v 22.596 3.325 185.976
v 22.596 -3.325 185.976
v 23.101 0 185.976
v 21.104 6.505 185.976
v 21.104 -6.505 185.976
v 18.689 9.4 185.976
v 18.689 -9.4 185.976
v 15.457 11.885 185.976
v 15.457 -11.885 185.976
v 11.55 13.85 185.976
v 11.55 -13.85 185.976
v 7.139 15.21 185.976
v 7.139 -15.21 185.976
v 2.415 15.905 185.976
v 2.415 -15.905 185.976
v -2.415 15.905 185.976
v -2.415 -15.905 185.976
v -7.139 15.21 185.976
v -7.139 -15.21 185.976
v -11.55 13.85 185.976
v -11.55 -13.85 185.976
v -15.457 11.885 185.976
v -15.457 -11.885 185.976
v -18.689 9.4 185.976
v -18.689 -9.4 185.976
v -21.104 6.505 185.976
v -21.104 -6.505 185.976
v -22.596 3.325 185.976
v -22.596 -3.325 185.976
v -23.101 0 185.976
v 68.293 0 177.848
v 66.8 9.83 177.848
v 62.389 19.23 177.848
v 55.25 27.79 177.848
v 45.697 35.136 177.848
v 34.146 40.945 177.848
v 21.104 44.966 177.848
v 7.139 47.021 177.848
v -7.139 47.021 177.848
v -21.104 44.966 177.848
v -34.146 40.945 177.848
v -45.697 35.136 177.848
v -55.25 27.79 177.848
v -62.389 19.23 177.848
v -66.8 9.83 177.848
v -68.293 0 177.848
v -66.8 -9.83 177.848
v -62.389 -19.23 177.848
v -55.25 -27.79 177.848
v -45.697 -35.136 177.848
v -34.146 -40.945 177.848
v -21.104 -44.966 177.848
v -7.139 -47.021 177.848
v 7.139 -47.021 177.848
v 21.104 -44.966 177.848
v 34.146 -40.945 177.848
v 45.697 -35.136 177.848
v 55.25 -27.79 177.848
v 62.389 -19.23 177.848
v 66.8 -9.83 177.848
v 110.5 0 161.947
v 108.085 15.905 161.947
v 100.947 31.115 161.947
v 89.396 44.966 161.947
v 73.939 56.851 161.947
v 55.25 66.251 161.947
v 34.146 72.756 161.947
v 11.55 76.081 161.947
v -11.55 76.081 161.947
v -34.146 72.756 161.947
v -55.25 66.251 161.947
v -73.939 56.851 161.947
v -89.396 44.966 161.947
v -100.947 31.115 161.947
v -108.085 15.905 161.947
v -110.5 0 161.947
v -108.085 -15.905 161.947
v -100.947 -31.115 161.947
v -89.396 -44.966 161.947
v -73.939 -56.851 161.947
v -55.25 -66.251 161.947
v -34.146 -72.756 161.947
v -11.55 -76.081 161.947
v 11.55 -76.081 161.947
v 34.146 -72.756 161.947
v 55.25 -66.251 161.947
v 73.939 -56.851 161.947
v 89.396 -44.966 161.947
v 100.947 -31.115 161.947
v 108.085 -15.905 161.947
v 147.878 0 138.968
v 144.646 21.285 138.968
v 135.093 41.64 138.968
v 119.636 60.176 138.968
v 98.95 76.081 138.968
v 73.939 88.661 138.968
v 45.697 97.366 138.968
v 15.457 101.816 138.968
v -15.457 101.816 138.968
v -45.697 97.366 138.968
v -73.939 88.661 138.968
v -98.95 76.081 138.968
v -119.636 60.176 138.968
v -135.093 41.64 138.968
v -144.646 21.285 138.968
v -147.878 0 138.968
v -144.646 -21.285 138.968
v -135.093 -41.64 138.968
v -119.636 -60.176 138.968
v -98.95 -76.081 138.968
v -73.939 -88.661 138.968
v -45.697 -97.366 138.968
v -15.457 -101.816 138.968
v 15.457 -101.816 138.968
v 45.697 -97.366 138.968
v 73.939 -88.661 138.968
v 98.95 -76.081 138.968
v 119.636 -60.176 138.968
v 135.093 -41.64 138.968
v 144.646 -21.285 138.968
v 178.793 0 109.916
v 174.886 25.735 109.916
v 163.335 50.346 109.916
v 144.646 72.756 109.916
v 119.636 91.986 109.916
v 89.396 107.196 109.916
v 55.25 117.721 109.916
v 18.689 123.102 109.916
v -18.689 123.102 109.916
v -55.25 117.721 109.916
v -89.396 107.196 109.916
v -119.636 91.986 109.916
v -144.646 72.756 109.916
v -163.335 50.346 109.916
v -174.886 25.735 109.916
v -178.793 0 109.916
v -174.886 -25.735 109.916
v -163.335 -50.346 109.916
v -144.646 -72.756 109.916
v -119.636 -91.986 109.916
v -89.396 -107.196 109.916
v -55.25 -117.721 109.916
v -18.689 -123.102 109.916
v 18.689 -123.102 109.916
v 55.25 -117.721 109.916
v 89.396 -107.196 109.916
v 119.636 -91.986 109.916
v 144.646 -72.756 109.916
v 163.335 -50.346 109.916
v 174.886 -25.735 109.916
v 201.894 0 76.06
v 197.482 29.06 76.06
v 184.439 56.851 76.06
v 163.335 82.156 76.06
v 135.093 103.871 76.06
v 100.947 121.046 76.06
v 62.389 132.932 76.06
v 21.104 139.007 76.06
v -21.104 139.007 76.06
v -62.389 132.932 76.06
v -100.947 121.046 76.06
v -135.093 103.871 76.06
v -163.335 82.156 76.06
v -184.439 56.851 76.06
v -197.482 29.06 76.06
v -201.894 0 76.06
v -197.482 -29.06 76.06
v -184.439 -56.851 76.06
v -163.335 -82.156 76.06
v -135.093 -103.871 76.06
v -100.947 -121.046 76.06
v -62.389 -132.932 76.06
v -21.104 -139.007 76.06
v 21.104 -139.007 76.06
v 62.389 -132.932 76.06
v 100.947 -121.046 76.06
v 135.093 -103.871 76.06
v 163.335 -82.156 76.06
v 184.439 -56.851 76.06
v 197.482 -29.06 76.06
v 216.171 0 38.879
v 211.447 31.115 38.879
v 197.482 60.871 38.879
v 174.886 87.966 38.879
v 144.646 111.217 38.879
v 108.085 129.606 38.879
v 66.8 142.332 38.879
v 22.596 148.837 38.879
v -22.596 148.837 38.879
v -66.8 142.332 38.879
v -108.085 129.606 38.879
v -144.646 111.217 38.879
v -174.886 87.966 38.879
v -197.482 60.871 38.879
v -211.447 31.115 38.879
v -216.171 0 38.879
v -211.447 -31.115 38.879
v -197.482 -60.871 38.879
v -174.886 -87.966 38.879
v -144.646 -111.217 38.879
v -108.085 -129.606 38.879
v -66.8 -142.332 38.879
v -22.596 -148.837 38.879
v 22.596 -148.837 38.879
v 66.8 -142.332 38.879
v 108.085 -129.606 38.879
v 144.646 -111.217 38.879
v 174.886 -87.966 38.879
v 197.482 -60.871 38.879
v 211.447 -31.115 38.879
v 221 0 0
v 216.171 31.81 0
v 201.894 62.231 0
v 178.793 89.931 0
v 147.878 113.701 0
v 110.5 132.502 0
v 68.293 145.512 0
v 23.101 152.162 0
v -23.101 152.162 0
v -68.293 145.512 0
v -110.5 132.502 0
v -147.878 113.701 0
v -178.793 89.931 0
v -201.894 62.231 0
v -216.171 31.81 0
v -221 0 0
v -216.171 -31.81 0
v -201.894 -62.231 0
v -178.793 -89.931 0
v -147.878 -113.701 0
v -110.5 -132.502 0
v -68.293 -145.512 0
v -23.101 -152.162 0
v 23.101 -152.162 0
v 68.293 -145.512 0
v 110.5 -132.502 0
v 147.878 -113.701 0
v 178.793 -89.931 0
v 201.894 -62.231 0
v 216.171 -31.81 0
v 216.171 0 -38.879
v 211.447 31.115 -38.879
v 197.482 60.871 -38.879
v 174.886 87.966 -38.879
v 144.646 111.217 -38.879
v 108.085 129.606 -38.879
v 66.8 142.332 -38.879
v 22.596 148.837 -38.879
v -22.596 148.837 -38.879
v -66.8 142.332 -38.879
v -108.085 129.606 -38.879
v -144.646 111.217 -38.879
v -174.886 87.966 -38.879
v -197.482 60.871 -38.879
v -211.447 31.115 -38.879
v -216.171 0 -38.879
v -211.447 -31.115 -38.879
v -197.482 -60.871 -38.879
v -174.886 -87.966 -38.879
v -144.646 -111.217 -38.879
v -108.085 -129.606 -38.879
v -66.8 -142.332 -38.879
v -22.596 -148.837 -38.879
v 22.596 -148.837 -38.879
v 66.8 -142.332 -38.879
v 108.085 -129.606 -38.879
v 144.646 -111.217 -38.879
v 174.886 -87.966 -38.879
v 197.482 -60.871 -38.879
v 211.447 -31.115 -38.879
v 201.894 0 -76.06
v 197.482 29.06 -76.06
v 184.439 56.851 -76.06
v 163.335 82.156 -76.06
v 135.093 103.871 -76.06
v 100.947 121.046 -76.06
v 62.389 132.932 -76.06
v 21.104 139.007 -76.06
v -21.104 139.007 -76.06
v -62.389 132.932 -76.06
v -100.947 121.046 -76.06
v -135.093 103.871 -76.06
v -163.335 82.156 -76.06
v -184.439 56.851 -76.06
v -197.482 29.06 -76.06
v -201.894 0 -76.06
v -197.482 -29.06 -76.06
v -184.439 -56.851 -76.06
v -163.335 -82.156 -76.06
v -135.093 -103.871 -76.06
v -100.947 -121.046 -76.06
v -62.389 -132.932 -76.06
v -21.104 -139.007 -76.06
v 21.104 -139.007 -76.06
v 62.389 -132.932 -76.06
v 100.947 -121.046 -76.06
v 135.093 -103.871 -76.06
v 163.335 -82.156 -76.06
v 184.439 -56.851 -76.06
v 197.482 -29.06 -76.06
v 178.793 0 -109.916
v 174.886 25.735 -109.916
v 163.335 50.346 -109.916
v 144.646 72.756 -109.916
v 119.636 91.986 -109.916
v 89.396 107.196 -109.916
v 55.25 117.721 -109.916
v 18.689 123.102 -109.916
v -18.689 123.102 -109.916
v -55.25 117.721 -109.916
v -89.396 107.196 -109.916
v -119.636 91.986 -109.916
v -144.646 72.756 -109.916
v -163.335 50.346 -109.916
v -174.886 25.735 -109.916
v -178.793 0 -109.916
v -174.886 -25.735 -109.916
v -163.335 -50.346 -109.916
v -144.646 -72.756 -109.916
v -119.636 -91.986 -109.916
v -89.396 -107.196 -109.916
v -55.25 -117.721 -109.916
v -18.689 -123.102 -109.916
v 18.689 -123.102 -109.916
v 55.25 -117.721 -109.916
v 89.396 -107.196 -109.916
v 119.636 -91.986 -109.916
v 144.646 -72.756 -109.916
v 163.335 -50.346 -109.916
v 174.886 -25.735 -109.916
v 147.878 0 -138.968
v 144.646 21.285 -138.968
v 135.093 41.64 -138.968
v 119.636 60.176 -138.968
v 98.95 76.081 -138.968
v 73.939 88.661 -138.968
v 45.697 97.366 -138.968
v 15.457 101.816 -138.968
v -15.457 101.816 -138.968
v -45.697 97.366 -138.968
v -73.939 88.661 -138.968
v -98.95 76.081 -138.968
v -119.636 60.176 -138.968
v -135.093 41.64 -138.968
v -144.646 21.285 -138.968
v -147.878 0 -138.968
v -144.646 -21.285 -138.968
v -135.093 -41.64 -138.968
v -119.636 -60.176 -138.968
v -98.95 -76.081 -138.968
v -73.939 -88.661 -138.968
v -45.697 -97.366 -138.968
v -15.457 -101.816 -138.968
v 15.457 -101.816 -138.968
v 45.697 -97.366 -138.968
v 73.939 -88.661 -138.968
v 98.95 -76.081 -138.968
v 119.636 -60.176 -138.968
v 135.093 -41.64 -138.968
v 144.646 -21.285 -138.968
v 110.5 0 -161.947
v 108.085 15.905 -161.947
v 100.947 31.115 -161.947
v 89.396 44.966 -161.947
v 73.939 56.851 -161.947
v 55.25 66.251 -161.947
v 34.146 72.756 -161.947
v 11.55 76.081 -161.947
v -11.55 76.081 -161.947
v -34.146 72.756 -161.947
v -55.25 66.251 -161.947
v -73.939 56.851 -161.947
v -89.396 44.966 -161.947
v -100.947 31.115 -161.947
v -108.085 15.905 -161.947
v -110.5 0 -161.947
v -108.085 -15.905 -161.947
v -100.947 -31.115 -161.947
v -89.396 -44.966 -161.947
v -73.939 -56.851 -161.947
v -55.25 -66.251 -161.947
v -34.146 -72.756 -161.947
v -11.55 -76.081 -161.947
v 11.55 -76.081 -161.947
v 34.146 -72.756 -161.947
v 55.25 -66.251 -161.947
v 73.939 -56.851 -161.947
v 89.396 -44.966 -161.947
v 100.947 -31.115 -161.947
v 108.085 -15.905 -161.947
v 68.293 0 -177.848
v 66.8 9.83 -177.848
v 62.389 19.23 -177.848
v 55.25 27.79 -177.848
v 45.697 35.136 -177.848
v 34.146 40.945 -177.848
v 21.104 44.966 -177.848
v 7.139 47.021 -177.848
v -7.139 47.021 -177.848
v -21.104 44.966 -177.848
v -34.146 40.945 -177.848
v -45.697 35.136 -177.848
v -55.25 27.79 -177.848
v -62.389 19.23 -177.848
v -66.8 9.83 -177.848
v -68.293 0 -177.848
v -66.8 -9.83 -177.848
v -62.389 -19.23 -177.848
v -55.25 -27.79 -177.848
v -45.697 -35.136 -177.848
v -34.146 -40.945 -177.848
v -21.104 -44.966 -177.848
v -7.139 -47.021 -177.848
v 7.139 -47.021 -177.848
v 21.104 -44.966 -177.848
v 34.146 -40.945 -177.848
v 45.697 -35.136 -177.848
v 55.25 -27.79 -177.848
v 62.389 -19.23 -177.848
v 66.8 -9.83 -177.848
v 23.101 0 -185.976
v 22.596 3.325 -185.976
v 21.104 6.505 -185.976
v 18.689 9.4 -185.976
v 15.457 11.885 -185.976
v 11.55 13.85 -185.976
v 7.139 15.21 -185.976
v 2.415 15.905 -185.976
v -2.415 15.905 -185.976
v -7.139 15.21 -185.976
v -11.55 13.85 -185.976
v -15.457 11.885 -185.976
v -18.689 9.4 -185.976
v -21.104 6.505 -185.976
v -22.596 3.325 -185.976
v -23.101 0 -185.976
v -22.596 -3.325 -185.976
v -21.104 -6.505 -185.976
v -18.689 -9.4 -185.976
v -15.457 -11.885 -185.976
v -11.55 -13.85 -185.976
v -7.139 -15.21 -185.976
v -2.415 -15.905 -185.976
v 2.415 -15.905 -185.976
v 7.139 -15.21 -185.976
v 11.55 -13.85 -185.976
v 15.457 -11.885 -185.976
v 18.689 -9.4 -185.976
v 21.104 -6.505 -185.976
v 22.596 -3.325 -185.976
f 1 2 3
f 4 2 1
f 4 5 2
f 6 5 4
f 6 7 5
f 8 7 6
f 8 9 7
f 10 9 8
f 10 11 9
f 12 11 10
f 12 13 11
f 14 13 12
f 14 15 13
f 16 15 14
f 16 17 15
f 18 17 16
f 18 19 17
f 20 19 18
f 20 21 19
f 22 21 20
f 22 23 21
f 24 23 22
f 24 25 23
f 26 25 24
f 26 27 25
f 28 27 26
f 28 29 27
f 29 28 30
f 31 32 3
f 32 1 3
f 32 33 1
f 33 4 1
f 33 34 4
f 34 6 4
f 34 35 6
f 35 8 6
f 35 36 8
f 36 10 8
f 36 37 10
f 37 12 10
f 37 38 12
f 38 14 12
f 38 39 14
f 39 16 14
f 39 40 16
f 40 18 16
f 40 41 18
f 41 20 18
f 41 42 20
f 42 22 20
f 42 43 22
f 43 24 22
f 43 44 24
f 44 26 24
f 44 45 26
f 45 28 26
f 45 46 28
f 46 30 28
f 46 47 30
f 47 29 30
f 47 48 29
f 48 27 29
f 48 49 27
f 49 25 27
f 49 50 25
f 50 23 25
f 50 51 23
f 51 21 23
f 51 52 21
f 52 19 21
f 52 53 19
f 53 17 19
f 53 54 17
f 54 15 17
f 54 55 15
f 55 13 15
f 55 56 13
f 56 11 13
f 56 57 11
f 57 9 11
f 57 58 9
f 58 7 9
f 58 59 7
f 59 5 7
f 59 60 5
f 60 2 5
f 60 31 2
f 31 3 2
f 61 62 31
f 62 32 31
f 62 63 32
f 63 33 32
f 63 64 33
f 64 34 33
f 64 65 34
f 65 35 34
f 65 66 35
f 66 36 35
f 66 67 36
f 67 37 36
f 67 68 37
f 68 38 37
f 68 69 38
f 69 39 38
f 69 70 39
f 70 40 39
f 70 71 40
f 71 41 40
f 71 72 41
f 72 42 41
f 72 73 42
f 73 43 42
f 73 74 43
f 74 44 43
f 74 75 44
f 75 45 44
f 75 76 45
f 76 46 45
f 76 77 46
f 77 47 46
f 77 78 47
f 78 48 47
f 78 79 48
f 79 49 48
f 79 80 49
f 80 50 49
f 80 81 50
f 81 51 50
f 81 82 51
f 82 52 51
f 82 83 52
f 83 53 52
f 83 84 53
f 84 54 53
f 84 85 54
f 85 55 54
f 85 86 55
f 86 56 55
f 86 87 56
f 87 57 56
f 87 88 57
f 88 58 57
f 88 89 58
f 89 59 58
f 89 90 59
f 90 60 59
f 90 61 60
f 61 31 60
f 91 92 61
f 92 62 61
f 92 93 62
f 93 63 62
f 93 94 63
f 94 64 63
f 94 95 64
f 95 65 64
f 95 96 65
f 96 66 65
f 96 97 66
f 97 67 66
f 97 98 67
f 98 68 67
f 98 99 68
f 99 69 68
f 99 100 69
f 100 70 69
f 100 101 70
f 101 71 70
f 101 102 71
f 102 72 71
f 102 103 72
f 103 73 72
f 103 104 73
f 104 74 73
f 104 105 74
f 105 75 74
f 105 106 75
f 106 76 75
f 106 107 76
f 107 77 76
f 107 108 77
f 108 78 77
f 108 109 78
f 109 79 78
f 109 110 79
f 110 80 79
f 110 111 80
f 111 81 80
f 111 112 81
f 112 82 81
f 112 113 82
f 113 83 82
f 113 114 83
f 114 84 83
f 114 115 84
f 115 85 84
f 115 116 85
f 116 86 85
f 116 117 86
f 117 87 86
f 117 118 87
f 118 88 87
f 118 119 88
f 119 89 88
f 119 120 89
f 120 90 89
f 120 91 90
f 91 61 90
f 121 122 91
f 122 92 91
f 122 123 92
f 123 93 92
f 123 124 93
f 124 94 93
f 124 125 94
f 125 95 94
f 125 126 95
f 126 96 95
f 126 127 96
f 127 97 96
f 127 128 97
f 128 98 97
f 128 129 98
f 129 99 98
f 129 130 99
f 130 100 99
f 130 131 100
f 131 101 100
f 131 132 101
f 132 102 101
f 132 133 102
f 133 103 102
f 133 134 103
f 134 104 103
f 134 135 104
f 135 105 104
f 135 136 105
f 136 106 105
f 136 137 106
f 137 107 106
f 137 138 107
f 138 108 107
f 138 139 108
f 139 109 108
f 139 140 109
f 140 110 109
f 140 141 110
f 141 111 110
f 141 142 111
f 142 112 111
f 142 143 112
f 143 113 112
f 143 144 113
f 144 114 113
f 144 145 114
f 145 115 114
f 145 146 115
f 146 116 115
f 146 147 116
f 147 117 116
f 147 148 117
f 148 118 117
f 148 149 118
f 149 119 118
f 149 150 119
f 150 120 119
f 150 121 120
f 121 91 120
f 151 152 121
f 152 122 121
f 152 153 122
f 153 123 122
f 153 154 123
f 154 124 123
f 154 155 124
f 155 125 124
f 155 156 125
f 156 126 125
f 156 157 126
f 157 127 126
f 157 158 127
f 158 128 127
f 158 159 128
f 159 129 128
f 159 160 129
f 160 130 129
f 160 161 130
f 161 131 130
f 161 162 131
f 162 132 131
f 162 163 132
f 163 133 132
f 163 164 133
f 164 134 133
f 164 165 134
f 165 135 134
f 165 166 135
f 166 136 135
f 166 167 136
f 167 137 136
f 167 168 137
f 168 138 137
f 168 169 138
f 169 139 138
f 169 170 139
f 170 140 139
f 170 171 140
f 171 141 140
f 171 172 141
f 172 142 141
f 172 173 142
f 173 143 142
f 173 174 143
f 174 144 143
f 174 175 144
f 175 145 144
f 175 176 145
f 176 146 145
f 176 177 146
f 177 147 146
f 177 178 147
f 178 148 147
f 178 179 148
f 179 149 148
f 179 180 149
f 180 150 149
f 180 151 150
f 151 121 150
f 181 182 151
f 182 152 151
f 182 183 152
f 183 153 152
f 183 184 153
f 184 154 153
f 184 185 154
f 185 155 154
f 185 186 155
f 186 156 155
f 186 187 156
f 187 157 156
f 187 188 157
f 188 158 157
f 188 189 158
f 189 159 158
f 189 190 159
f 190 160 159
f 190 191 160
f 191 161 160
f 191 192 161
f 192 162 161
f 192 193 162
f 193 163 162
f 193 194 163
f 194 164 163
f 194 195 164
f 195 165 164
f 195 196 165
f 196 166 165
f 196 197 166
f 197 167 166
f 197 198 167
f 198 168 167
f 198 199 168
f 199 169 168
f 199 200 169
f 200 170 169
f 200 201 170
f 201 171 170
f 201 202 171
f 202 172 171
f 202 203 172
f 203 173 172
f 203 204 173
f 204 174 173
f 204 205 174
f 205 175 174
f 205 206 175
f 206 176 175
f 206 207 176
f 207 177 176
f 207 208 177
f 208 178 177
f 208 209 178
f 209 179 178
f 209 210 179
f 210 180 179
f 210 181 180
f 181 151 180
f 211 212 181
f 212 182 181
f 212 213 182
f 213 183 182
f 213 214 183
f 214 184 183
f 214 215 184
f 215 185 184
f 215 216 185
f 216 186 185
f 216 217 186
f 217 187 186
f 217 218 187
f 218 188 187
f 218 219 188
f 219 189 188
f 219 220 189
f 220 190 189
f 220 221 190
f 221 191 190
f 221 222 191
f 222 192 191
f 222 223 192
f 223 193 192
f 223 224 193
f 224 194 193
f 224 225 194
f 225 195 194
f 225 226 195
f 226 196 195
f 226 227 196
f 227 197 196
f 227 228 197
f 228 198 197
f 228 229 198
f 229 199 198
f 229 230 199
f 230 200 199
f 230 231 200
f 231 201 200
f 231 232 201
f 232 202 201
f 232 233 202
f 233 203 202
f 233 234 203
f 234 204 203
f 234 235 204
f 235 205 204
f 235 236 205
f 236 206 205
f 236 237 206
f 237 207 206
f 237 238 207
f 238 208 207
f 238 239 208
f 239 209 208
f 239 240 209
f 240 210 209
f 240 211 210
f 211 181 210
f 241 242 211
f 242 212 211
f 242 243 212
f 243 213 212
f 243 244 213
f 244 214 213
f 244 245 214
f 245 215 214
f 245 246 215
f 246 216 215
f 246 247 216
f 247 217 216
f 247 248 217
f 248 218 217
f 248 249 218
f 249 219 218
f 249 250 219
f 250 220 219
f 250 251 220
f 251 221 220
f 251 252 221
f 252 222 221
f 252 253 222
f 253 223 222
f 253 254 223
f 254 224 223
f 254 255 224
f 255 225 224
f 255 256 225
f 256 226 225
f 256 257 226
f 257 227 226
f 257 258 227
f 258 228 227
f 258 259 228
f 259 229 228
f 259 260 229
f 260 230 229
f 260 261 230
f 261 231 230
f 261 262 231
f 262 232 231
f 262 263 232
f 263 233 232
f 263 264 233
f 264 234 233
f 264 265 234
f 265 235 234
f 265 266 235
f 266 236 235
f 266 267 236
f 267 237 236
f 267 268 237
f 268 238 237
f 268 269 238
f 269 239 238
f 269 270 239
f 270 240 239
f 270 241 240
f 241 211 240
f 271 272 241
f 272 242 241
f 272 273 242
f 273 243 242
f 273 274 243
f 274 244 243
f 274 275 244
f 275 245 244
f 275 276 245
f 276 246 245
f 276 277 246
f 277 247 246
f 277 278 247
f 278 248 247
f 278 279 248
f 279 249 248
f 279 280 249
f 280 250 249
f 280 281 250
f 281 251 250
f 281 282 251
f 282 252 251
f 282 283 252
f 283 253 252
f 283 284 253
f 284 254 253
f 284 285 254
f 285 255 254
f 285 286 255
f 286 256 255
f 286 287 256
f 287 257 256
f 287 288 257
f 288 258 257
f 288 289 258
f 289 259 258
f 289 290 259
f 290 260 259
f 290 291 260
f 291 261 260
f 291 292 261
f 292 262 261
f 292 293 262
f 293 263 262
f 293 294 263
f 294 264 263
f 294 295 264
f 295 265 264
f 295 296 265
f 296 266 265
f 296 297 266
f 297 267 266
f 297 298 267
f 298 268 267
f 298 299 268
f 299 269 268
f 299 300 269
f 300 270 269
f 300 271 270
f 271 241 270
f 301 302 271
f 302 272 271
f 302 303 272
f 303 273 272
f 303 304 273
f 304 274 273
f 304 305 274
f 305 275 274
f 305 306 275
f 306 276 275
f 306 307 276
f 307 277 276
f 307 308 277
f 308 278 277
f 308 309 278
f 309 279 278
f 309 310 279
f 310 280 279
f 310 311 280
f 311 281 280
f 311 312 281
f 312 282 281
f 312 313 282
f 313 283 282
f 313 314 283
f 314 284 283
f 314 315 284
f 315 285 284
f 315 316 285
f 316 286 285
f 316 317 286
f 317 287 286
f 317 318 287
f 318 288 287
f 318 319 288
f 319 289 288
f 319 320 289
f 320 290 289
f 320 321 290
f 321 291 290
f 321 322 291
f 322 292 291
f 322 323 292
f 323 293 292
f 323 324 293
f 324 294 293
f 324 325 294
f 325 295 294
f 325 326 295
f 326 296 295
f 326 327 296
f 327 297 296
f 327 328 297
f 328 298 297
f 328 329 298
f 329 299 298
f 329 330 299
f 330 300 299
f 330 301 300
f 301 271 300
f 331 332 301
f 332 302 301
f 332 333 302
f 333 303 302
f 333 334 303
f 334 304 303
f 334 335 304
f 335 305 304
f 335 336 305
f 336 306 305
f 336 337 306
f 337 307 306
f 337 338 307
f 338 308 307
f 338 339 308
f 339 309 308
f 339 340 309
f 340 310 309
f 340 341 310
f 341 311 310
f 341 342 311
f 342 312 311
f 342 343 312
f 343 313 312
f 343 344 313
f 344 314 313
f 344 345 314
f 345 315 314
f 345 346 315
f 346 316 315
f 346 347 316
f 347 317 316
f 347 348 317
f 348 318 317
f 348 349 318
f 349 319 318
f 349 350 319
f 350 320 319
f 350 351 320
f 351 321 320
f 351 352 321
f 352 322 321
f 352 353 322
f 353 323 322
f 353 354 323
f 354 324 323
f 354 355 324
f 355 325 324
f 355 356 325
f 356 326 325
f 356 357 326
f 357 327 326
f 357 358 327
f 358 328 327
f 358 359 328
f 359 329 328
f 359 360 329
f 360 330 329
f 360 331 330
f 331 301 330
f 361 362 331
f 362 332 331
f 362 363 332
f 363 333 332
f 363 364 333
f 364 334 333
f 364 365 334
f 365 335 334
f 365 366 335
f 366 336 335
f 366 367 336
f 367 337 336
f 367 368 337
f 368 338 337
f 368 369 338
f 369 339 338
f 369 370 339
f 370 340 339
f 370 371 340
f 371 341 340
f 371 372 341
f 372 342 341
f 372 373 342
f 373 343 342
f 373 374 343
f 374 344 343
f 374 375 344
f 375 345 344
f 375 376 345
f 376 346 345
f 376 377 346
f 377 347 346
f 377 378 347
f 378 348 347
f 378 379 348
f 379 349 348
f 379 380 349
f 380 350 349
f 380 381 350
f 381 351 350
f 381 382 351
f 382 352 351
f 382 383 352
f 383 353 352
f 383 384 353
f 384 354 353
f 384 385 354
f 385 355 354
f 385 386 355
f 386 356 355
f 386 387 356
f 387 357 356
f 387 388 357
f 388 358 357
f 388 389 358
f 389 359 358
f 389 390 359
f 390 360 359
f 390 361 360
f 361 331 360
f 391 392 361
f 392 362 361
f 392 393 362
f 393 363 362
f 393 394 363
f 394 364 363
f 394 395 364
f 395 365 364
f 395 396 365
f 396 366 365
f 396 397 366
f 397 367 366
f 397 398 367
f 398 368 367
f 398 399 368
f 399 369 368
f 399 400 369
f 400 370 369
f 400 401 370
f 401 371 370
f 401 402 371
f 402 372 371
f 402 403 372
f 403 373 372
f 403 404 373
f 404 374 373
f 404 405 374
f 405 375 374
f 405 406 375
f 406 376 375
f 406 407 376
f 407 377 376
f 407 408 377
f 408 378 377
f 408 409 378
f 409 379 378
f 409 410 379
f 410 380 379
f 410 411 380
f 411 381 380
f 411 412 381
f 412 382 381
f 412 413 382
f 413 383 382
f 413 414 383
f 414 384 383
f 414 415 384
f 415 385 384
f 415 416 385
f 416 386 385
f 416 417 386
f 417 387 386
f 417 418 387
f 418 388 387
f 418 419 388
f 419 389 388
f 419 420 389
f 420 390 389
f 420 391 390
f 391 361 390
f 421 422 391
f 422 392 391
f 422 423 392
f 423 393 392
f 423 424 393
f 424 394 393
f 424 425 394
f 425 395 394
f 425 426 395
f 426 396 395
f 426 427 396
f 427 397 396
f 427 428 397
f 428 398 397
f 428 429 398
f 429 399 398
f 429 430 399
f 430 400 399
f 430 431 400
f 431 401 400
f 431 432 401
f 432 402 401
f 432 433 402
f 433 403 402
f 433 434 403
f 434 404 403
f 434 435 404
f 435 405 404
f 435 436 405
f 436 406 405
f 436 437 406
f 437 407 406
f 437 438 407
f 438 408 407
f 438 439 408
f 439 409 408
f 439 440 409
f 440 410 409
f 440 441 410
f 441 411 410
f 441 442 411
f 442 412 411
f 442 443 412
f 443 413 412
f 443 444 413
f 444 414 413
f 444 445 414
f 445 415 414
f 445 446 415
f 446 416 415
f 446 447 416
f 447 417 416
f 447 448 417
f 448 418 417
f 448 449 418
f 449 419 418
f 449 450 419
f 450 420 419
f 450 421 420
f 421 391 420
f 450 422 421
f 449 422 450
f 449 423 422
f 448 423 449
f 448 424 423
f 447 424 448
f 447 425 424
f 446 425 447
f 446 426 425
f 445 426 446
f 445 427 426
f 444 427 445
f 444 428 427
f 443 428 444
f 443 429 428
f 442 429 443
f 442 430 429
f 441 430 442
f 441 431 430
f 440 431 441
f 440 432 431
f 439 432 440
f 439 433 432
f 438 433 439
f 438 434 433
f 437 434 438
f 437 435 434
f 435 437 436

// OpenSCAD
// Generated by SolidPython 1.0.1 on 2020-07-29 00:46:50


scale(v = [13, 9, 11]) {
	sphere(r = 17);
}
/***********************************************
*********      SolidPython code:      **********
************************************************
 
# import packages: SolidPython
from solid import *
from solid.utils import *
from itertools import chain, combinations, permutations


class Resize:

    def __init__(self, scad_file):
        self.scad_file = scad_file
        #self.scad_file = import_scad(scad_file)
        # cone/cylinder param:
        self.r1 = 0
        self.r2 = 0
        self.h = 0
        # rectangular prism param:
        self.w = 0
        self.l = 0
        # ellipse param:
        self.r = 0

    # import OpenScad code (file name corresponds to shape)


    # classify shape + parameters
    def assign(self, param1, param2, param3):
        if self.scad_file == 'cone.scad':
            self.r1 = param1
            self.r2 = param2
            self.h = param3
        elif self.scad_file == 'cylinder.scad':
            self.r1 = param1
            self.r2 = param2
            self.h = param3
        elif self.scad_file == 'rectangularPrism.scad':
            self.h = param1
            self.l = param2
            self.w = param3
        else:
            self.r = param1
            self.h = param2

    # resize parameters
    def iterate(self):
        x = range(3, 20, 2)
        i = 1
        if self.scad_file == 'cone.scad':
            tempList = list(permutations(x, 2))
            for temp in tempList:
                param1 = temp[0]
                param2 = temp[1]
                filepath = 'produced_scad_files/' + 'cone' + str(param1) + '_' + str(param2) + '_' + '.scad'
                scad_render_to_file(cylinder(h=param1, r1=param2, r2=0), filepath)

        elif self.scad_file == 'cylinder.scad':
            tempList = list(permutations(x, 3))
            for temp in tempList:
                param1 = temp[0]
                param2 = temp[1]
                filepath = 'produced_scad_files/' + 'cylinder' + str(param1) + '_' + str(param2) + '_' + '.scad'
                scad_render_to_file(cylinder(h=param1, r1=param2, r2=param2), filepath)

        elif self.scad_file == 'rectangularPrism.scad':
            tempList = list(permutations(x, 3))
            for temp in tempList:
                param1 = temp[0]
                param2 = temp[1]
                param3 = temp[2]
                filepath = 'produced_scad_files/' + 'rectangularPrism' + str(param1) + '_' + str(param2) + '_' + str(
                    param3) + '.scad'
                scad_render_to_file(cube(size=(param1, param2, param3)), filepath)

        elif self.scad_file == 'ellipse.scad':
            tempList = list(permutations(x, 4))
            for temp in tempList:
                param1 = temp[0]
                param2 = temp[1]
                param3 = temp[2]
                param4 = temp[3]
                filepath = 'produced_scad_files/' + 'ellipse' + str(param1) + '_' + str(param2) + '_' + str(param3) + '_' + str(param4) + '.scad'
                scad_render_to_file(scale([param1, param2, param3])(sphere(r=param4)), filepath)

    def render_to_scadfile(self):
        scad_render_to_file(scad, 'example.scad') 
 
************************************************/
